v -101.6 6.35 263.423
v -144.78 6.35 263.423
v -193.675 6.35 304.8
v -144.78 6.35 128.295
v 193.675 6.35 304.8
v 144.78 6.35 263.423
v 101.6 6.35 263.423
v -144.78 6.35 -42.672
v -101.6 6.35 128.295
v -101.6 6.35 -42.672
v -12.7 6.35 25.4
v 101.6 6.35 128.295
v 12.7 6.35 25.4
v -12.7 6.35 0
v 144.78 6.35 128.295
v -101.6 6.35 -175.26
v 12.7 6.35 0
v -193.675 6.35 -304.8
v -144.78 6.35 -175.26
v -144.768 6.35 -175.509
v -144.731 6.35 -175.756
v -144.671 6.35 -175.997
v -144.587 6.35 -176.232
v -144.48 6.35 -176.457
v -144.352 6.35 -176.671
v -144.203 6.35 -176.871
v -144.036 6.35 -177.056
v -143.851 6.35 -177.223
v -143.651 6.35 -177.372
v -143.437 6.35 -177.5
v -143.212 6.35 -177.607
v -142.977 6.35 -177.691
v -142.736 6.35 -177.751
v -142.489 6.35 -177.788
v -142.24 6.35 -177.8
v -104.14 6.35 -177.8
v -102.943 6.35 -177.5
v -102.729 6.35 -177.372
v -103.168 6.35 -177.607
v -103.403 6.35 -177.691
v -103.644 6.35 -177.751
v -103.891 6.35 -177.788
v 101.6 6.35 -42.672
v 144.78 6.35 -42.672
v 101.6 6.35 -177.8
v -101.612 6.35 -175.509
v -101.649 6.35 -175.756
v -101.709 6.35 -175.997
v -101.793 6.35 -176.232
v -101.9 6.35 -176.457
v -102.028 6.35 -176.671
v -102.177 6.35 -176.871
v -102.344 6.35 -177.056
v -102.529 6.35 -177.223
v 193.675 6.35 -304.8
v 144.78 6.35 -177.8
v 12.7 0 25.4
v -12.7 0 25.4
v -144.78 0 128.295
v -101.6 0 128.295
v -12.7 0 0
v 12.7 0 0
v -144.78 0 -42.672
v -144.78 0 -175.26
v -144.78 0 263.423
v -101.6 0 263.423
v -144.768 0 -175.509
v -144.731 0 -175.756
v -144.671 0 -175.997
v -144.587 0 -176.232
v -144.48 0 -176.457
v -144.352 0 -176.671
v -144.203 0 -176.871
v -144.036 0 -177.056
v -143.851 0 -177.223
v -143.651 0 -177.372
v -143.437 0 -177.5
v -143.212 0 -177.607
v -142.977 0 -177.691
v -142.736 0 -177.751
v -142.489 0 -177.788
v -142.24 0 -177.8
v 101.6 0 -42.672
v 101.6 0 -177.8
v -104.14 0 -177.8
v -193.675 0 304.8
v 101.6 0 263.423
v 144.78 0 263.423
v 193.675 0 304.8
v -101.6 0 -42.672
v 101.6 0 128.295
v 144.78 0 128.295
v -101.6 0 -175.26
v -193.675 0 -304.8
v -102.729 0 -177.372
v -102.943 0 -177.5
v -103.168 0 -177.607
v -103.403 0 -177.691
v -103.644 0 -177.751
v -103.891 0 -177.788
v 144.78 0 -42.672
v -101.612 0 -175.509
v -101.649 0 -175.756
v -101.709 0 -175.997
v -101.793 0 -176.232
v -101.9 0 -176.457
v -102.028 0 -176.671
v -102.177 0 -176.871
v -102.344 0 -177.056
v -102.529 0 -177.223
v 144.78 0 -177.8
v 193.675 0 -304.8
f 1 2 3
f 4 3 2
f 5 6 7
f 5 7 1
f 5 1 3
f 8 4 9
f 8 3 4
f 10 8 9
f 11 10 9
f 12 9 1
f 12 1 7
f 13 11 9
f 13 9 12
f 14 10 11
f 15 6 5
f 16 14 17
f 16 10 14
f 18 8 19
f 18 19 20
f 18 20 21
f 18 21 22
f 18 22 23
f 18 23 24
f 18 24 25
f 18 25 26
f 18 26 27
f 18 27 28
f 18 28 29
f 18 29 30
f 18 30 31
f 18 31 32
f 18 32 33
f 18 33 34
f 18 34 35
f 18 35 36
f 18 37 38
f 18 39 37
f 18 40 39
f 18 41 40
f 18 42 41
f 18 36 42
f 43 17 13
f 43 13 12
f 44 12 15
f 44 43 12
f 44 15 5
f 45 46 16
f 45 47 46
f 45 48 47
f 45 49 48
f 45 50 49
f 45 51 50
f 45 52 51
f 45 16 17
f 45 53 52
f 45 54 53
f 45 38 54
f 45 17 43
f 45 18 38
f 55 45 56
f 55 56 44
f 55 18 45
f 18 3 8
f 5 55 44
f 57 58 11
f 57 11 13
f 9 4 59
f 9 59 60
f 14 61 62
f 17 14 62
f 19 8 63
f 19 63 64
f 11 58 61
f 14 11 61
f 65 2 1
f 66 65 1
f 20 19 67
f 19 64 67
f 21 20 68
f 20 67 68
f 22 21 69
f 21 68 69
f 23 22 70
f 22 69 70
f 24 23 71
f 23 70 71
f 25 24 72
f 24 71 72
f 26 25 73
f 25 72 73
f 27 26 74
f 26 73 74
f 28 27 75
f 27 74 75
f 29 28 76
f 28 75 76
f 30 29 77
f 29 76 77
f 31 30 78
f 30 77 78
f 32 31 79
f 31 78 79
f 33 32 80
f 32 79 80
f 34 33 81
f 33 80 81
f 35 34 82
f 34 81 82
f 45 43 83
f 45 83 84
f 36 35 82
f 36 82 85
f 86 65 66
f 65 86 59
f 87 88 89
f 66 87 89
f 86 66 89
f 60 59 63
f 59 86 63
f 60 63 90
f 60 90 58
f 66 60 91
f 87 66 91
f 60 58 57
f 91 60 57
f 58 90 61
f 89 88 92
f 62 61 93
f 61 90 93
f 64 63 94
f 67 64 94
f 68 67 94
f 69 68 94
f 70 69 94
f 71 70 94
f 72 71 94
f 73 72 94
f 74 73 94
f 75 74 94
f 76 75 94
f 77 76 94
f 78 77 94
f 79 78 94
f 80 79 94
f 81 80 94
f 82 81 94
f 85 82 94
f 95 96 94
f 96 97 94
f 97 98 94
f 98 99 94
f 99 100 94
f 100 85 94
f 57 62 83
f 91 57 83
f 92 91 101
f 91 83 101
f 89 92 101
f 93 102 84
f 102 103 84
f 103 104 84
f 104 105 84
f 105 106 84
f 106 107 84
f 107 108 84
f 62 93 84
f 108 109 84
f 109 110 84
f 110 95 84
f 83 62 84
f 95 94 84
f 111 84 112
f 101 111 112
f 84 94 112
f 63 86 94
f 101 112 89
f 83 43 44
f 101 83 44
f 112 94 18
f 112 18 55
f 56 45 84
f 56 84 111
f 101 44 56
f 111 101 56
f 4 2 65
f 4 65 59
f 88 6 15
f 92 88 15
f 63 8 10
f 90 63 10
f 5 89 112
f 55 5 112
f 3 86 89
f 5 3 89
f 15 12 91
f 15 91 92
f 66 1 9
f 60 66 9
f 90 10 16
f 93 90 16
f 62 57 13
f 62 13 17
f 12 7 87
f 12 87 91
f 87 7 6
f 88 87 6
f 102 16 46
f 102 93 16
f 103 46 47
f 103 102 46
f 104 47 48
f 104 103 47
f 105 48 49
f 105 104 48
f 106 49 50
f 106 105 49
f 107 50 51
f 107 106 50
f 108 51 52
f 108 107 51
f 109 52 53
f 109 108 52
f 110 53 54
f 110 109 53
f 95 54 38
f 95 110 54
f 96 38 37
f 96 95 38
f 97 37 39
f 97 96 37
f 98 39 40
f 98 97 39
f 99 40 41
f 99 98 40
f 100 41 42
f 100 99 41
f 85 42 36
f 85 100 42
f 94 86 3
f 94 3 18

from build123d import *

# Parameters (mm, degrees)
SKETCH1_W           = 387.35
SKETCH1_H           = 609.6
BOSS_EXTRUDE1_DEPTH = 6.35
SKETCH2_W           = 43.18
SKETCH2_H           = 135.128
CUT_EXTRUDE1_DEPTH  = 362.183288823
SKETCH4_W           = 25.4
SKETCH4_H           = 25.4
CUT_EXTRUDE3_DEPTH  = 362.183288823
FILLET1_R           = 2.54


with BuildPart() as part:
    # Sketch1 → Boss-Extrude1 (new body)
    with BuildSketch(Plane(origin=(0, 0, 0), x_dir=(1, 0, 0), z_dir=(0, 1, 0))):
        Rectangle(SKETCH1_W, SKETCH1_H)
    extrude(amount=BOSS_EXTRUDE1_DEPTH)

    # Sketch2 → Cut-Extrude1 (cut, through all)
    with BuildSketch(Plane(origin=(0, 6.35, 0), x_dir=(1, 0, 0), z_dir=(0, 1, 0))):
        with Locations((123.19, -195.8594)):
            Rectangle(SKETCH2_W, SKETCH2_H)
        with Locations((123.19, 110.236)):
            Rectangle(SKETCH2_W, SKETCH2_H)
        with Locations((-123.19, -195.8594)):
            Rectangle(SKETCH2_W, SKETCH2_H)
        with Locations((-123.19, 110.236)):
            Rectangle(SKETCH2_W, SKETCH2_H)
    extrude(amount=-CUT_EXTRUDE1_DEPTH, mode=Mode.SUBTRACT)

    # Sketch4 → Cut-Extrude3 (cut, through all)
    with BuildSketch(Plane(origin=(0, 0, 0), x_dir=(1, 0, 0), z_dir=(0, 1, 0))):
        with Locations((0, -12.7)):
            Rectangle(SKETCH4_W, SKETCH4_H)
    extrude(amount=CUT_EXTRUDE3_DEPTH, mode=Mode.SUBTRACT)

    # Fillet1
    fillet1_edges = [part.edges().sort_by_distance(p)[0] for p in [
        (-144.78, 3.175, -177.8),
        (-101.6, 3.175, -177.8),
    ]]
    fillet(fillet1_edges, radius=FILLET1_R)


solid = part.part
